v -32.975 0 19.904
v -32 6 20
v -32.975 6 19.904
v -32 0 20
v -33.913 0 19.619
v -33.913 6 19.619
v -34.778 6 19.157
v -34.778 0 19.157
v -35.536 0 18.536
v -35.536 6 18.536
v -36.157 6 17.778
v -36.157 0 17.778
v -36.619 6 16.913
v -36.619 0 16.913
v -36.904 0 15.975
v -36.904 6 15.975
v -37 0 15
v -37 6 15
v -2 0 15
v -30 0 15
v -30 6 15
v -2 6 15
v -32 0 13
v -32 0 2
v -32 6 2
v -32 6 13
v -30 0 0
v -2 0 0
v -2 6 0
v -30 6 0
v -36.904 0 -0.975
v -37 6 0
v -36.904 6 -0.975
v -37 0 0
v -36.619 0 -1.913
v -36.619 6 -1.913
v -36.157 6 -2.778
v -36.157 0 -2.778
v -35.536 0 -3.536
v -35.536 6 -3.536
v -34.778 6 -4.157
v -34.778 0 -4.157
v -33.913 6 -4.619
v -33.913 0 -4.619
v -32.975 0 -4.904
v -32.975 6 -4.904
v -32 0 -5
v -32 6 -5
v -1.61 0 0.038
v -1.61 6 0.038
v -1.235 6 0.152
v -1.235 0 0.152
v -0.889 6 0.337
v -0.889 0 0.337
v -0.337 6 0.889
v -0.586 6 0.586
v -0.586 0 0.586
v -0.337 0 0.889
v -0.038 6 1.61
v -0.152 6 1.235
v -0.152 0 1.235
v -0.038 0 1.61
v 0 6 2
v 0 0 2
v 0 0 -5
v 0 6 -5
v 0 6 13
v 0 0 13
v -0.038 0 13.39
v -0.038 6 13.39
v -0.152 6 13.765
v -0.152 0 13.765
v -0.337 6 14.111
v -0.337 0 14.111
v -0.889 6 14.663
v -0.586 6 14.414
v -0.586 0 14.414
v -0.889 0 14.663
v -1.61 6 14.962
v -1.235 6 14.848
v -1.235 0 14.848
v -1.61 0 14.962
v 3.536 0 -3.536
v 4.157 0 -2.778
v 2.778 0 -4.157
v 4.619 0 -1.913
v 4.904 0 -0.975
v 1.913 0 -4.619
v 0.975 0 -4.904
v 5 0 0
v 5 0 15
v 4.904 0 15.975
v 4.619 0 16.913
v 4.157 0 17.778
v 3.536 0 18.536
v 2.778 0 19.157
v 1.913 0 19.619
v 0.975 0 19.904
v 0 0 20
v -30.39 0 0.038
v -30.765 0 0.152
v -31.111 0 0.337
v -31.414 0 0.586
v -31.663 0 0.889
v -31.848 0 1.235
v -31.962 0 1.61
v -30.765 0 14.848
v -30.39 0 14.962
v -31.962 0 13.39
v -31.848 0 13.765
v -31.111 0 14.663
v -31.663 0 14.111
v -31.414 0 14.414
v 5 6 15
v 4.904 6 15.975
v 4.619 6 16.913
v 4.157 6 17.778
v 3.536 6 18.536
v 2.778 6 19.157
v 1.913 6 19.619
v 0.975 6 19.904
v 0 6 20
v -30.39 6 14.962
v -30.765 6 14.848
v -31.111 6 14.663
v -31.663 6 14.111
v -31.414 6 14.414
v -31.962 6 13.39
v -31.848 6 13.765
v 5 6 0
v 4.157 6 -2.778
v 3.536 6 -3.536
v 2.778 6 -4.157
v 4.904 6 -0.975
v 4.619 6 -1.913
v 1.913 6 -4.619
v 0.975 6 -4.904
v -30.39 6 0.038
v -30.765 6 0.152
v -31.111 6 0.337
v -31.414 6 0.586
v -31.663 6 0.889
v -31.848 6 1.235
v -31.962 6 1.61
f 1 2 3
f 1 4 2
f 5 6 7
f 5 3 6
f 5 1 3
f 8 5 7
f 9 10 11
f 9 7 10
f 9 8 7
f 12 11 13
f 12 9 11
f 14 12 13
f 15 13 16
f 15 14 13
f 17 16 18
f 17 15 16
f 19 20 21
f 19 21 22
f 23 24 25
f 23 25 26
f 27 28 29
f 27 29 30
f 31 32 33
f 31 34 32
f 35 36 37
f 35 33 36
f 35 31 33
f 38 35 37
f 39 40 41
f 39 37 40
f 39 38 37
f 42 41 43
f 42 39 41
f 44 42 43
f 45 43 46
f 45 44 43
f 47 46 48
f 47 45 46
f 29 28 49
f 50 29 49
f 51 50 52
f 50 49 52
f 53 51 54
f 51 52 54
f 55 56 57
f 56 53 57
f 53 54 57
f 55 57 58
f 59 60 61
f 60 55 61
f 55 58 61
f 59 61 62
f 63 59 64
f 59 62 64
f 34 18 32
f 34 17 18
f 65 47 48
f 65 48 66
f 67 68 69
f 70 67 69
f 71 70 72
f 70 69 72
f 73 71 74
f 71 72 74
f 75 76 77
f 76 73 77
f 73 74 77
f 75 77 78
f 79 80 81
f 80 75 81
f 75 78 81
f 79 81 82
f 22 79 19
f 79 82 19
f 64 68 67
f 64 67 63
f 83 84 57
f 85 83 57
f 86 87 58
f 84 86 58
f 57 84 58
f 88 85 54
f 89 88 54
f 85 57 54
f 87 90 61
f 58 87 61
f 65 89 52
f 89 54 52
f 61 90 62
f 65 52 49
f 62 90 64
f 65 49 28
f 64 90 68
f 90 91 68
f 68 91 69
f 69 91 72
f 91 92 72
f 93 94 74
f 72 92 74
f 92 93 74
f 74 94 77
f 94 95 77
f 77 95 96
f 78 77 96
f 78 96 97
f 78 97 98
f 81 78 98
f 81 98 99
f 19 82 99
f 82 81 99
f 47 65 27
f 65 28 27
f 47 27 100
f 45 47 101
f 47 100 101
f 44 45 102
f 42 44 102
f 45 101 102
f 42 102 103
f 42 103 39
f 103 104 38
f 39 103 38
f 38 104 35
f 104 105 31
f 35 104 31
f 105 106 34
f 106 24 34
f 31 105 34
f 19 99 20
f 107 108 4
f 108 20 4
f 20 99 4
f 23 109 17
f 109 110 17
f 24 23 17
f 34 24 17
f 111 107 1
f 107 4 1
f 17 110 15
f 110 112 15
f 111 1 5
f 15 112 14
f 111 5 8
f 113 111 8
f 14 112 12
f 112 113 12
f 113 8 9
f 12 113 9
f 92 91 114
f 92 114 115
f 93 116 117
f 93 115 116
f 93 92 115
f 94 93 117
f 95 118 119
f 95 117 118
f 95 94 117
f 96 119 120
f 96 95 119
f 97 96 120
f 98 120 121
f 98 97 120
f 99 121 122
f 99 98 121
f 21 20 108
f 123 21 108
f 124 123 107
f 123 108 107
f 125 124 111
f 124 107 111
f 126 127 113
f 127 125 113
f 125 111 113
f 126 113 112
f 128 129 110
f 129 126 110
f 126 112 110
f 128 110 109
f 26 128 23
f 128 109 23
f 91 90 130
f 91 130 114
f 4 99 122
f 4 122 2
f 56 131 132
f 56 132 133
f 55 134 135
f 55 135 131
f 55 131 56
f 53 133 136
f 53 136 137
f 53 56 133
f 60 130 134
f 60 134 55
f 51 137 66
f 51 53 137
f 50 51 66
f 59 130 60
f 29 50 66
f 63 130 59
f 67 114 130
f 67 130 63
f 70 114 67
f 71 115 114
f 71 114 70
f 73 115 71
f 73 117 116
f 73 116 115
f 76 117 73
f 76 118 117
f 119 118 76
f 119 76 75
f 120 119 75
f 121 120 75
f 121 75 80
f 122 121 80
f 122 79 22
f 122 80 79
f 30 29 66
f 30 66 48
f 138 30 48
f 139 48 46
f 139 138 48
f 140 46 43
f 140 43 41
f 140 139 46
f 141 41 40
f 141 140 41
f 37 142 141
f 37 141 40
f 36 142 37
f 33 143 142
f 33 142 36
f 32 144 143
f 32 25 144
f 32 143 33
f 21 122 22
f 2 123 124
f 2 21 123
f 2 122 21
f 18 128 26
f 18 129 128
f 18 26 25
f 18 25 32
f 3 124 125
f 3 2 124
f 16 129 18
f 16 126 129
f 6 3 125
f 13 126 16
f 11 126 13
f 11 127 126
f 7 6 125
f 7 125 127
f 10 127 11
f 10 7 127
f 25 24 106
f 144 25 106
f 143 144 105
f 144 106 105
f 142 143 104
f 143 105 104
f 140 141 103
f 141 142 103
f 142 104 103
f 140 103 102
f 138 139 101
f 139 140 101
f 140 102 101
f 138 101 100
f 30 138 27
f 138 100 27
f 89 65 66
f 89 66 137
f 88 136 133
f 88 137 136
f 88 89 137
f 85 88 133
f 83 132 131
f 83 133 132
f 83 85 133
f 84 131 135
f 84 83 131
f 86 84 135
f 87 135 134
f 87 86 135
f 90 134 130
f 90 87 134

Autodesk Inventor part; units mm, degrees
ref_plane "YZ Plane" through (0, 0, 0) normal (1, 0, 0) x (0, 1, 0)
ref_plane "XZ Plane" through (0, 0, 0) normal (0, 1, 0) x (-1, 0, 0)
ref_plane "XY Plane" through (0, 0, 0) normal (0, 0, 1) x (1, 0, 0)
sketch "Sketch1" plane through (0, 0, 0) normal (0, 1, 0) x (-1, 0, 0)
  line L0 (2, 0) -> (30, 0)
  line L1 (32, 2) -> (32, 13)
  line L2 (30, 15) -> (2, 15)
  line L3 (0, 13) -> (0, 2)
  line L4 (0, 20) -> (32, 20)
  line L5 (37, 15) -> (37, 0)
  line L6 (32, -5) -> (0, -5)
  line L7 (-5, 0) -> (-5, 15)
  arc A0 (0, 20) -> (-5, 15) centre (0, 15) ccw
  arc A1 (37, 15) -> (32, 20) centre (32, 15) ccw
  arc A2 (32, -5) -> (37, 0) centre (32, 0) ccw
  arc A3 (-5, 0) -> (0, -5) centre (0, 0) ccw
  arc A4 (2, 15) -> (0, 13) centre (2, 13) ccw
  arc A5 (32, 13) -> (30, 15) centre (30, 13) ccw
  arc A6 (30, 0) -> (32, 2) centre (30, 2) ccw
  arc A7 (0, 2) -> (2, 0) centre (2, 2) ccw
  point P0 (0, 0)
  point P1 (32, 0)
  point P2 (0, 15)
  dimension "d0" = 15
  dimension "d1" = 32
  dimension "d2" = 5
  dimension "d3" = 5
  dimension "d4" = 5
  dimension "d5" = 5
  dimension "d6" = 5
  dimension "d7" = 2
extrude "Extrusion1" add sketch "Sketch1" along normal blind 6
properties part number "Center Block"
